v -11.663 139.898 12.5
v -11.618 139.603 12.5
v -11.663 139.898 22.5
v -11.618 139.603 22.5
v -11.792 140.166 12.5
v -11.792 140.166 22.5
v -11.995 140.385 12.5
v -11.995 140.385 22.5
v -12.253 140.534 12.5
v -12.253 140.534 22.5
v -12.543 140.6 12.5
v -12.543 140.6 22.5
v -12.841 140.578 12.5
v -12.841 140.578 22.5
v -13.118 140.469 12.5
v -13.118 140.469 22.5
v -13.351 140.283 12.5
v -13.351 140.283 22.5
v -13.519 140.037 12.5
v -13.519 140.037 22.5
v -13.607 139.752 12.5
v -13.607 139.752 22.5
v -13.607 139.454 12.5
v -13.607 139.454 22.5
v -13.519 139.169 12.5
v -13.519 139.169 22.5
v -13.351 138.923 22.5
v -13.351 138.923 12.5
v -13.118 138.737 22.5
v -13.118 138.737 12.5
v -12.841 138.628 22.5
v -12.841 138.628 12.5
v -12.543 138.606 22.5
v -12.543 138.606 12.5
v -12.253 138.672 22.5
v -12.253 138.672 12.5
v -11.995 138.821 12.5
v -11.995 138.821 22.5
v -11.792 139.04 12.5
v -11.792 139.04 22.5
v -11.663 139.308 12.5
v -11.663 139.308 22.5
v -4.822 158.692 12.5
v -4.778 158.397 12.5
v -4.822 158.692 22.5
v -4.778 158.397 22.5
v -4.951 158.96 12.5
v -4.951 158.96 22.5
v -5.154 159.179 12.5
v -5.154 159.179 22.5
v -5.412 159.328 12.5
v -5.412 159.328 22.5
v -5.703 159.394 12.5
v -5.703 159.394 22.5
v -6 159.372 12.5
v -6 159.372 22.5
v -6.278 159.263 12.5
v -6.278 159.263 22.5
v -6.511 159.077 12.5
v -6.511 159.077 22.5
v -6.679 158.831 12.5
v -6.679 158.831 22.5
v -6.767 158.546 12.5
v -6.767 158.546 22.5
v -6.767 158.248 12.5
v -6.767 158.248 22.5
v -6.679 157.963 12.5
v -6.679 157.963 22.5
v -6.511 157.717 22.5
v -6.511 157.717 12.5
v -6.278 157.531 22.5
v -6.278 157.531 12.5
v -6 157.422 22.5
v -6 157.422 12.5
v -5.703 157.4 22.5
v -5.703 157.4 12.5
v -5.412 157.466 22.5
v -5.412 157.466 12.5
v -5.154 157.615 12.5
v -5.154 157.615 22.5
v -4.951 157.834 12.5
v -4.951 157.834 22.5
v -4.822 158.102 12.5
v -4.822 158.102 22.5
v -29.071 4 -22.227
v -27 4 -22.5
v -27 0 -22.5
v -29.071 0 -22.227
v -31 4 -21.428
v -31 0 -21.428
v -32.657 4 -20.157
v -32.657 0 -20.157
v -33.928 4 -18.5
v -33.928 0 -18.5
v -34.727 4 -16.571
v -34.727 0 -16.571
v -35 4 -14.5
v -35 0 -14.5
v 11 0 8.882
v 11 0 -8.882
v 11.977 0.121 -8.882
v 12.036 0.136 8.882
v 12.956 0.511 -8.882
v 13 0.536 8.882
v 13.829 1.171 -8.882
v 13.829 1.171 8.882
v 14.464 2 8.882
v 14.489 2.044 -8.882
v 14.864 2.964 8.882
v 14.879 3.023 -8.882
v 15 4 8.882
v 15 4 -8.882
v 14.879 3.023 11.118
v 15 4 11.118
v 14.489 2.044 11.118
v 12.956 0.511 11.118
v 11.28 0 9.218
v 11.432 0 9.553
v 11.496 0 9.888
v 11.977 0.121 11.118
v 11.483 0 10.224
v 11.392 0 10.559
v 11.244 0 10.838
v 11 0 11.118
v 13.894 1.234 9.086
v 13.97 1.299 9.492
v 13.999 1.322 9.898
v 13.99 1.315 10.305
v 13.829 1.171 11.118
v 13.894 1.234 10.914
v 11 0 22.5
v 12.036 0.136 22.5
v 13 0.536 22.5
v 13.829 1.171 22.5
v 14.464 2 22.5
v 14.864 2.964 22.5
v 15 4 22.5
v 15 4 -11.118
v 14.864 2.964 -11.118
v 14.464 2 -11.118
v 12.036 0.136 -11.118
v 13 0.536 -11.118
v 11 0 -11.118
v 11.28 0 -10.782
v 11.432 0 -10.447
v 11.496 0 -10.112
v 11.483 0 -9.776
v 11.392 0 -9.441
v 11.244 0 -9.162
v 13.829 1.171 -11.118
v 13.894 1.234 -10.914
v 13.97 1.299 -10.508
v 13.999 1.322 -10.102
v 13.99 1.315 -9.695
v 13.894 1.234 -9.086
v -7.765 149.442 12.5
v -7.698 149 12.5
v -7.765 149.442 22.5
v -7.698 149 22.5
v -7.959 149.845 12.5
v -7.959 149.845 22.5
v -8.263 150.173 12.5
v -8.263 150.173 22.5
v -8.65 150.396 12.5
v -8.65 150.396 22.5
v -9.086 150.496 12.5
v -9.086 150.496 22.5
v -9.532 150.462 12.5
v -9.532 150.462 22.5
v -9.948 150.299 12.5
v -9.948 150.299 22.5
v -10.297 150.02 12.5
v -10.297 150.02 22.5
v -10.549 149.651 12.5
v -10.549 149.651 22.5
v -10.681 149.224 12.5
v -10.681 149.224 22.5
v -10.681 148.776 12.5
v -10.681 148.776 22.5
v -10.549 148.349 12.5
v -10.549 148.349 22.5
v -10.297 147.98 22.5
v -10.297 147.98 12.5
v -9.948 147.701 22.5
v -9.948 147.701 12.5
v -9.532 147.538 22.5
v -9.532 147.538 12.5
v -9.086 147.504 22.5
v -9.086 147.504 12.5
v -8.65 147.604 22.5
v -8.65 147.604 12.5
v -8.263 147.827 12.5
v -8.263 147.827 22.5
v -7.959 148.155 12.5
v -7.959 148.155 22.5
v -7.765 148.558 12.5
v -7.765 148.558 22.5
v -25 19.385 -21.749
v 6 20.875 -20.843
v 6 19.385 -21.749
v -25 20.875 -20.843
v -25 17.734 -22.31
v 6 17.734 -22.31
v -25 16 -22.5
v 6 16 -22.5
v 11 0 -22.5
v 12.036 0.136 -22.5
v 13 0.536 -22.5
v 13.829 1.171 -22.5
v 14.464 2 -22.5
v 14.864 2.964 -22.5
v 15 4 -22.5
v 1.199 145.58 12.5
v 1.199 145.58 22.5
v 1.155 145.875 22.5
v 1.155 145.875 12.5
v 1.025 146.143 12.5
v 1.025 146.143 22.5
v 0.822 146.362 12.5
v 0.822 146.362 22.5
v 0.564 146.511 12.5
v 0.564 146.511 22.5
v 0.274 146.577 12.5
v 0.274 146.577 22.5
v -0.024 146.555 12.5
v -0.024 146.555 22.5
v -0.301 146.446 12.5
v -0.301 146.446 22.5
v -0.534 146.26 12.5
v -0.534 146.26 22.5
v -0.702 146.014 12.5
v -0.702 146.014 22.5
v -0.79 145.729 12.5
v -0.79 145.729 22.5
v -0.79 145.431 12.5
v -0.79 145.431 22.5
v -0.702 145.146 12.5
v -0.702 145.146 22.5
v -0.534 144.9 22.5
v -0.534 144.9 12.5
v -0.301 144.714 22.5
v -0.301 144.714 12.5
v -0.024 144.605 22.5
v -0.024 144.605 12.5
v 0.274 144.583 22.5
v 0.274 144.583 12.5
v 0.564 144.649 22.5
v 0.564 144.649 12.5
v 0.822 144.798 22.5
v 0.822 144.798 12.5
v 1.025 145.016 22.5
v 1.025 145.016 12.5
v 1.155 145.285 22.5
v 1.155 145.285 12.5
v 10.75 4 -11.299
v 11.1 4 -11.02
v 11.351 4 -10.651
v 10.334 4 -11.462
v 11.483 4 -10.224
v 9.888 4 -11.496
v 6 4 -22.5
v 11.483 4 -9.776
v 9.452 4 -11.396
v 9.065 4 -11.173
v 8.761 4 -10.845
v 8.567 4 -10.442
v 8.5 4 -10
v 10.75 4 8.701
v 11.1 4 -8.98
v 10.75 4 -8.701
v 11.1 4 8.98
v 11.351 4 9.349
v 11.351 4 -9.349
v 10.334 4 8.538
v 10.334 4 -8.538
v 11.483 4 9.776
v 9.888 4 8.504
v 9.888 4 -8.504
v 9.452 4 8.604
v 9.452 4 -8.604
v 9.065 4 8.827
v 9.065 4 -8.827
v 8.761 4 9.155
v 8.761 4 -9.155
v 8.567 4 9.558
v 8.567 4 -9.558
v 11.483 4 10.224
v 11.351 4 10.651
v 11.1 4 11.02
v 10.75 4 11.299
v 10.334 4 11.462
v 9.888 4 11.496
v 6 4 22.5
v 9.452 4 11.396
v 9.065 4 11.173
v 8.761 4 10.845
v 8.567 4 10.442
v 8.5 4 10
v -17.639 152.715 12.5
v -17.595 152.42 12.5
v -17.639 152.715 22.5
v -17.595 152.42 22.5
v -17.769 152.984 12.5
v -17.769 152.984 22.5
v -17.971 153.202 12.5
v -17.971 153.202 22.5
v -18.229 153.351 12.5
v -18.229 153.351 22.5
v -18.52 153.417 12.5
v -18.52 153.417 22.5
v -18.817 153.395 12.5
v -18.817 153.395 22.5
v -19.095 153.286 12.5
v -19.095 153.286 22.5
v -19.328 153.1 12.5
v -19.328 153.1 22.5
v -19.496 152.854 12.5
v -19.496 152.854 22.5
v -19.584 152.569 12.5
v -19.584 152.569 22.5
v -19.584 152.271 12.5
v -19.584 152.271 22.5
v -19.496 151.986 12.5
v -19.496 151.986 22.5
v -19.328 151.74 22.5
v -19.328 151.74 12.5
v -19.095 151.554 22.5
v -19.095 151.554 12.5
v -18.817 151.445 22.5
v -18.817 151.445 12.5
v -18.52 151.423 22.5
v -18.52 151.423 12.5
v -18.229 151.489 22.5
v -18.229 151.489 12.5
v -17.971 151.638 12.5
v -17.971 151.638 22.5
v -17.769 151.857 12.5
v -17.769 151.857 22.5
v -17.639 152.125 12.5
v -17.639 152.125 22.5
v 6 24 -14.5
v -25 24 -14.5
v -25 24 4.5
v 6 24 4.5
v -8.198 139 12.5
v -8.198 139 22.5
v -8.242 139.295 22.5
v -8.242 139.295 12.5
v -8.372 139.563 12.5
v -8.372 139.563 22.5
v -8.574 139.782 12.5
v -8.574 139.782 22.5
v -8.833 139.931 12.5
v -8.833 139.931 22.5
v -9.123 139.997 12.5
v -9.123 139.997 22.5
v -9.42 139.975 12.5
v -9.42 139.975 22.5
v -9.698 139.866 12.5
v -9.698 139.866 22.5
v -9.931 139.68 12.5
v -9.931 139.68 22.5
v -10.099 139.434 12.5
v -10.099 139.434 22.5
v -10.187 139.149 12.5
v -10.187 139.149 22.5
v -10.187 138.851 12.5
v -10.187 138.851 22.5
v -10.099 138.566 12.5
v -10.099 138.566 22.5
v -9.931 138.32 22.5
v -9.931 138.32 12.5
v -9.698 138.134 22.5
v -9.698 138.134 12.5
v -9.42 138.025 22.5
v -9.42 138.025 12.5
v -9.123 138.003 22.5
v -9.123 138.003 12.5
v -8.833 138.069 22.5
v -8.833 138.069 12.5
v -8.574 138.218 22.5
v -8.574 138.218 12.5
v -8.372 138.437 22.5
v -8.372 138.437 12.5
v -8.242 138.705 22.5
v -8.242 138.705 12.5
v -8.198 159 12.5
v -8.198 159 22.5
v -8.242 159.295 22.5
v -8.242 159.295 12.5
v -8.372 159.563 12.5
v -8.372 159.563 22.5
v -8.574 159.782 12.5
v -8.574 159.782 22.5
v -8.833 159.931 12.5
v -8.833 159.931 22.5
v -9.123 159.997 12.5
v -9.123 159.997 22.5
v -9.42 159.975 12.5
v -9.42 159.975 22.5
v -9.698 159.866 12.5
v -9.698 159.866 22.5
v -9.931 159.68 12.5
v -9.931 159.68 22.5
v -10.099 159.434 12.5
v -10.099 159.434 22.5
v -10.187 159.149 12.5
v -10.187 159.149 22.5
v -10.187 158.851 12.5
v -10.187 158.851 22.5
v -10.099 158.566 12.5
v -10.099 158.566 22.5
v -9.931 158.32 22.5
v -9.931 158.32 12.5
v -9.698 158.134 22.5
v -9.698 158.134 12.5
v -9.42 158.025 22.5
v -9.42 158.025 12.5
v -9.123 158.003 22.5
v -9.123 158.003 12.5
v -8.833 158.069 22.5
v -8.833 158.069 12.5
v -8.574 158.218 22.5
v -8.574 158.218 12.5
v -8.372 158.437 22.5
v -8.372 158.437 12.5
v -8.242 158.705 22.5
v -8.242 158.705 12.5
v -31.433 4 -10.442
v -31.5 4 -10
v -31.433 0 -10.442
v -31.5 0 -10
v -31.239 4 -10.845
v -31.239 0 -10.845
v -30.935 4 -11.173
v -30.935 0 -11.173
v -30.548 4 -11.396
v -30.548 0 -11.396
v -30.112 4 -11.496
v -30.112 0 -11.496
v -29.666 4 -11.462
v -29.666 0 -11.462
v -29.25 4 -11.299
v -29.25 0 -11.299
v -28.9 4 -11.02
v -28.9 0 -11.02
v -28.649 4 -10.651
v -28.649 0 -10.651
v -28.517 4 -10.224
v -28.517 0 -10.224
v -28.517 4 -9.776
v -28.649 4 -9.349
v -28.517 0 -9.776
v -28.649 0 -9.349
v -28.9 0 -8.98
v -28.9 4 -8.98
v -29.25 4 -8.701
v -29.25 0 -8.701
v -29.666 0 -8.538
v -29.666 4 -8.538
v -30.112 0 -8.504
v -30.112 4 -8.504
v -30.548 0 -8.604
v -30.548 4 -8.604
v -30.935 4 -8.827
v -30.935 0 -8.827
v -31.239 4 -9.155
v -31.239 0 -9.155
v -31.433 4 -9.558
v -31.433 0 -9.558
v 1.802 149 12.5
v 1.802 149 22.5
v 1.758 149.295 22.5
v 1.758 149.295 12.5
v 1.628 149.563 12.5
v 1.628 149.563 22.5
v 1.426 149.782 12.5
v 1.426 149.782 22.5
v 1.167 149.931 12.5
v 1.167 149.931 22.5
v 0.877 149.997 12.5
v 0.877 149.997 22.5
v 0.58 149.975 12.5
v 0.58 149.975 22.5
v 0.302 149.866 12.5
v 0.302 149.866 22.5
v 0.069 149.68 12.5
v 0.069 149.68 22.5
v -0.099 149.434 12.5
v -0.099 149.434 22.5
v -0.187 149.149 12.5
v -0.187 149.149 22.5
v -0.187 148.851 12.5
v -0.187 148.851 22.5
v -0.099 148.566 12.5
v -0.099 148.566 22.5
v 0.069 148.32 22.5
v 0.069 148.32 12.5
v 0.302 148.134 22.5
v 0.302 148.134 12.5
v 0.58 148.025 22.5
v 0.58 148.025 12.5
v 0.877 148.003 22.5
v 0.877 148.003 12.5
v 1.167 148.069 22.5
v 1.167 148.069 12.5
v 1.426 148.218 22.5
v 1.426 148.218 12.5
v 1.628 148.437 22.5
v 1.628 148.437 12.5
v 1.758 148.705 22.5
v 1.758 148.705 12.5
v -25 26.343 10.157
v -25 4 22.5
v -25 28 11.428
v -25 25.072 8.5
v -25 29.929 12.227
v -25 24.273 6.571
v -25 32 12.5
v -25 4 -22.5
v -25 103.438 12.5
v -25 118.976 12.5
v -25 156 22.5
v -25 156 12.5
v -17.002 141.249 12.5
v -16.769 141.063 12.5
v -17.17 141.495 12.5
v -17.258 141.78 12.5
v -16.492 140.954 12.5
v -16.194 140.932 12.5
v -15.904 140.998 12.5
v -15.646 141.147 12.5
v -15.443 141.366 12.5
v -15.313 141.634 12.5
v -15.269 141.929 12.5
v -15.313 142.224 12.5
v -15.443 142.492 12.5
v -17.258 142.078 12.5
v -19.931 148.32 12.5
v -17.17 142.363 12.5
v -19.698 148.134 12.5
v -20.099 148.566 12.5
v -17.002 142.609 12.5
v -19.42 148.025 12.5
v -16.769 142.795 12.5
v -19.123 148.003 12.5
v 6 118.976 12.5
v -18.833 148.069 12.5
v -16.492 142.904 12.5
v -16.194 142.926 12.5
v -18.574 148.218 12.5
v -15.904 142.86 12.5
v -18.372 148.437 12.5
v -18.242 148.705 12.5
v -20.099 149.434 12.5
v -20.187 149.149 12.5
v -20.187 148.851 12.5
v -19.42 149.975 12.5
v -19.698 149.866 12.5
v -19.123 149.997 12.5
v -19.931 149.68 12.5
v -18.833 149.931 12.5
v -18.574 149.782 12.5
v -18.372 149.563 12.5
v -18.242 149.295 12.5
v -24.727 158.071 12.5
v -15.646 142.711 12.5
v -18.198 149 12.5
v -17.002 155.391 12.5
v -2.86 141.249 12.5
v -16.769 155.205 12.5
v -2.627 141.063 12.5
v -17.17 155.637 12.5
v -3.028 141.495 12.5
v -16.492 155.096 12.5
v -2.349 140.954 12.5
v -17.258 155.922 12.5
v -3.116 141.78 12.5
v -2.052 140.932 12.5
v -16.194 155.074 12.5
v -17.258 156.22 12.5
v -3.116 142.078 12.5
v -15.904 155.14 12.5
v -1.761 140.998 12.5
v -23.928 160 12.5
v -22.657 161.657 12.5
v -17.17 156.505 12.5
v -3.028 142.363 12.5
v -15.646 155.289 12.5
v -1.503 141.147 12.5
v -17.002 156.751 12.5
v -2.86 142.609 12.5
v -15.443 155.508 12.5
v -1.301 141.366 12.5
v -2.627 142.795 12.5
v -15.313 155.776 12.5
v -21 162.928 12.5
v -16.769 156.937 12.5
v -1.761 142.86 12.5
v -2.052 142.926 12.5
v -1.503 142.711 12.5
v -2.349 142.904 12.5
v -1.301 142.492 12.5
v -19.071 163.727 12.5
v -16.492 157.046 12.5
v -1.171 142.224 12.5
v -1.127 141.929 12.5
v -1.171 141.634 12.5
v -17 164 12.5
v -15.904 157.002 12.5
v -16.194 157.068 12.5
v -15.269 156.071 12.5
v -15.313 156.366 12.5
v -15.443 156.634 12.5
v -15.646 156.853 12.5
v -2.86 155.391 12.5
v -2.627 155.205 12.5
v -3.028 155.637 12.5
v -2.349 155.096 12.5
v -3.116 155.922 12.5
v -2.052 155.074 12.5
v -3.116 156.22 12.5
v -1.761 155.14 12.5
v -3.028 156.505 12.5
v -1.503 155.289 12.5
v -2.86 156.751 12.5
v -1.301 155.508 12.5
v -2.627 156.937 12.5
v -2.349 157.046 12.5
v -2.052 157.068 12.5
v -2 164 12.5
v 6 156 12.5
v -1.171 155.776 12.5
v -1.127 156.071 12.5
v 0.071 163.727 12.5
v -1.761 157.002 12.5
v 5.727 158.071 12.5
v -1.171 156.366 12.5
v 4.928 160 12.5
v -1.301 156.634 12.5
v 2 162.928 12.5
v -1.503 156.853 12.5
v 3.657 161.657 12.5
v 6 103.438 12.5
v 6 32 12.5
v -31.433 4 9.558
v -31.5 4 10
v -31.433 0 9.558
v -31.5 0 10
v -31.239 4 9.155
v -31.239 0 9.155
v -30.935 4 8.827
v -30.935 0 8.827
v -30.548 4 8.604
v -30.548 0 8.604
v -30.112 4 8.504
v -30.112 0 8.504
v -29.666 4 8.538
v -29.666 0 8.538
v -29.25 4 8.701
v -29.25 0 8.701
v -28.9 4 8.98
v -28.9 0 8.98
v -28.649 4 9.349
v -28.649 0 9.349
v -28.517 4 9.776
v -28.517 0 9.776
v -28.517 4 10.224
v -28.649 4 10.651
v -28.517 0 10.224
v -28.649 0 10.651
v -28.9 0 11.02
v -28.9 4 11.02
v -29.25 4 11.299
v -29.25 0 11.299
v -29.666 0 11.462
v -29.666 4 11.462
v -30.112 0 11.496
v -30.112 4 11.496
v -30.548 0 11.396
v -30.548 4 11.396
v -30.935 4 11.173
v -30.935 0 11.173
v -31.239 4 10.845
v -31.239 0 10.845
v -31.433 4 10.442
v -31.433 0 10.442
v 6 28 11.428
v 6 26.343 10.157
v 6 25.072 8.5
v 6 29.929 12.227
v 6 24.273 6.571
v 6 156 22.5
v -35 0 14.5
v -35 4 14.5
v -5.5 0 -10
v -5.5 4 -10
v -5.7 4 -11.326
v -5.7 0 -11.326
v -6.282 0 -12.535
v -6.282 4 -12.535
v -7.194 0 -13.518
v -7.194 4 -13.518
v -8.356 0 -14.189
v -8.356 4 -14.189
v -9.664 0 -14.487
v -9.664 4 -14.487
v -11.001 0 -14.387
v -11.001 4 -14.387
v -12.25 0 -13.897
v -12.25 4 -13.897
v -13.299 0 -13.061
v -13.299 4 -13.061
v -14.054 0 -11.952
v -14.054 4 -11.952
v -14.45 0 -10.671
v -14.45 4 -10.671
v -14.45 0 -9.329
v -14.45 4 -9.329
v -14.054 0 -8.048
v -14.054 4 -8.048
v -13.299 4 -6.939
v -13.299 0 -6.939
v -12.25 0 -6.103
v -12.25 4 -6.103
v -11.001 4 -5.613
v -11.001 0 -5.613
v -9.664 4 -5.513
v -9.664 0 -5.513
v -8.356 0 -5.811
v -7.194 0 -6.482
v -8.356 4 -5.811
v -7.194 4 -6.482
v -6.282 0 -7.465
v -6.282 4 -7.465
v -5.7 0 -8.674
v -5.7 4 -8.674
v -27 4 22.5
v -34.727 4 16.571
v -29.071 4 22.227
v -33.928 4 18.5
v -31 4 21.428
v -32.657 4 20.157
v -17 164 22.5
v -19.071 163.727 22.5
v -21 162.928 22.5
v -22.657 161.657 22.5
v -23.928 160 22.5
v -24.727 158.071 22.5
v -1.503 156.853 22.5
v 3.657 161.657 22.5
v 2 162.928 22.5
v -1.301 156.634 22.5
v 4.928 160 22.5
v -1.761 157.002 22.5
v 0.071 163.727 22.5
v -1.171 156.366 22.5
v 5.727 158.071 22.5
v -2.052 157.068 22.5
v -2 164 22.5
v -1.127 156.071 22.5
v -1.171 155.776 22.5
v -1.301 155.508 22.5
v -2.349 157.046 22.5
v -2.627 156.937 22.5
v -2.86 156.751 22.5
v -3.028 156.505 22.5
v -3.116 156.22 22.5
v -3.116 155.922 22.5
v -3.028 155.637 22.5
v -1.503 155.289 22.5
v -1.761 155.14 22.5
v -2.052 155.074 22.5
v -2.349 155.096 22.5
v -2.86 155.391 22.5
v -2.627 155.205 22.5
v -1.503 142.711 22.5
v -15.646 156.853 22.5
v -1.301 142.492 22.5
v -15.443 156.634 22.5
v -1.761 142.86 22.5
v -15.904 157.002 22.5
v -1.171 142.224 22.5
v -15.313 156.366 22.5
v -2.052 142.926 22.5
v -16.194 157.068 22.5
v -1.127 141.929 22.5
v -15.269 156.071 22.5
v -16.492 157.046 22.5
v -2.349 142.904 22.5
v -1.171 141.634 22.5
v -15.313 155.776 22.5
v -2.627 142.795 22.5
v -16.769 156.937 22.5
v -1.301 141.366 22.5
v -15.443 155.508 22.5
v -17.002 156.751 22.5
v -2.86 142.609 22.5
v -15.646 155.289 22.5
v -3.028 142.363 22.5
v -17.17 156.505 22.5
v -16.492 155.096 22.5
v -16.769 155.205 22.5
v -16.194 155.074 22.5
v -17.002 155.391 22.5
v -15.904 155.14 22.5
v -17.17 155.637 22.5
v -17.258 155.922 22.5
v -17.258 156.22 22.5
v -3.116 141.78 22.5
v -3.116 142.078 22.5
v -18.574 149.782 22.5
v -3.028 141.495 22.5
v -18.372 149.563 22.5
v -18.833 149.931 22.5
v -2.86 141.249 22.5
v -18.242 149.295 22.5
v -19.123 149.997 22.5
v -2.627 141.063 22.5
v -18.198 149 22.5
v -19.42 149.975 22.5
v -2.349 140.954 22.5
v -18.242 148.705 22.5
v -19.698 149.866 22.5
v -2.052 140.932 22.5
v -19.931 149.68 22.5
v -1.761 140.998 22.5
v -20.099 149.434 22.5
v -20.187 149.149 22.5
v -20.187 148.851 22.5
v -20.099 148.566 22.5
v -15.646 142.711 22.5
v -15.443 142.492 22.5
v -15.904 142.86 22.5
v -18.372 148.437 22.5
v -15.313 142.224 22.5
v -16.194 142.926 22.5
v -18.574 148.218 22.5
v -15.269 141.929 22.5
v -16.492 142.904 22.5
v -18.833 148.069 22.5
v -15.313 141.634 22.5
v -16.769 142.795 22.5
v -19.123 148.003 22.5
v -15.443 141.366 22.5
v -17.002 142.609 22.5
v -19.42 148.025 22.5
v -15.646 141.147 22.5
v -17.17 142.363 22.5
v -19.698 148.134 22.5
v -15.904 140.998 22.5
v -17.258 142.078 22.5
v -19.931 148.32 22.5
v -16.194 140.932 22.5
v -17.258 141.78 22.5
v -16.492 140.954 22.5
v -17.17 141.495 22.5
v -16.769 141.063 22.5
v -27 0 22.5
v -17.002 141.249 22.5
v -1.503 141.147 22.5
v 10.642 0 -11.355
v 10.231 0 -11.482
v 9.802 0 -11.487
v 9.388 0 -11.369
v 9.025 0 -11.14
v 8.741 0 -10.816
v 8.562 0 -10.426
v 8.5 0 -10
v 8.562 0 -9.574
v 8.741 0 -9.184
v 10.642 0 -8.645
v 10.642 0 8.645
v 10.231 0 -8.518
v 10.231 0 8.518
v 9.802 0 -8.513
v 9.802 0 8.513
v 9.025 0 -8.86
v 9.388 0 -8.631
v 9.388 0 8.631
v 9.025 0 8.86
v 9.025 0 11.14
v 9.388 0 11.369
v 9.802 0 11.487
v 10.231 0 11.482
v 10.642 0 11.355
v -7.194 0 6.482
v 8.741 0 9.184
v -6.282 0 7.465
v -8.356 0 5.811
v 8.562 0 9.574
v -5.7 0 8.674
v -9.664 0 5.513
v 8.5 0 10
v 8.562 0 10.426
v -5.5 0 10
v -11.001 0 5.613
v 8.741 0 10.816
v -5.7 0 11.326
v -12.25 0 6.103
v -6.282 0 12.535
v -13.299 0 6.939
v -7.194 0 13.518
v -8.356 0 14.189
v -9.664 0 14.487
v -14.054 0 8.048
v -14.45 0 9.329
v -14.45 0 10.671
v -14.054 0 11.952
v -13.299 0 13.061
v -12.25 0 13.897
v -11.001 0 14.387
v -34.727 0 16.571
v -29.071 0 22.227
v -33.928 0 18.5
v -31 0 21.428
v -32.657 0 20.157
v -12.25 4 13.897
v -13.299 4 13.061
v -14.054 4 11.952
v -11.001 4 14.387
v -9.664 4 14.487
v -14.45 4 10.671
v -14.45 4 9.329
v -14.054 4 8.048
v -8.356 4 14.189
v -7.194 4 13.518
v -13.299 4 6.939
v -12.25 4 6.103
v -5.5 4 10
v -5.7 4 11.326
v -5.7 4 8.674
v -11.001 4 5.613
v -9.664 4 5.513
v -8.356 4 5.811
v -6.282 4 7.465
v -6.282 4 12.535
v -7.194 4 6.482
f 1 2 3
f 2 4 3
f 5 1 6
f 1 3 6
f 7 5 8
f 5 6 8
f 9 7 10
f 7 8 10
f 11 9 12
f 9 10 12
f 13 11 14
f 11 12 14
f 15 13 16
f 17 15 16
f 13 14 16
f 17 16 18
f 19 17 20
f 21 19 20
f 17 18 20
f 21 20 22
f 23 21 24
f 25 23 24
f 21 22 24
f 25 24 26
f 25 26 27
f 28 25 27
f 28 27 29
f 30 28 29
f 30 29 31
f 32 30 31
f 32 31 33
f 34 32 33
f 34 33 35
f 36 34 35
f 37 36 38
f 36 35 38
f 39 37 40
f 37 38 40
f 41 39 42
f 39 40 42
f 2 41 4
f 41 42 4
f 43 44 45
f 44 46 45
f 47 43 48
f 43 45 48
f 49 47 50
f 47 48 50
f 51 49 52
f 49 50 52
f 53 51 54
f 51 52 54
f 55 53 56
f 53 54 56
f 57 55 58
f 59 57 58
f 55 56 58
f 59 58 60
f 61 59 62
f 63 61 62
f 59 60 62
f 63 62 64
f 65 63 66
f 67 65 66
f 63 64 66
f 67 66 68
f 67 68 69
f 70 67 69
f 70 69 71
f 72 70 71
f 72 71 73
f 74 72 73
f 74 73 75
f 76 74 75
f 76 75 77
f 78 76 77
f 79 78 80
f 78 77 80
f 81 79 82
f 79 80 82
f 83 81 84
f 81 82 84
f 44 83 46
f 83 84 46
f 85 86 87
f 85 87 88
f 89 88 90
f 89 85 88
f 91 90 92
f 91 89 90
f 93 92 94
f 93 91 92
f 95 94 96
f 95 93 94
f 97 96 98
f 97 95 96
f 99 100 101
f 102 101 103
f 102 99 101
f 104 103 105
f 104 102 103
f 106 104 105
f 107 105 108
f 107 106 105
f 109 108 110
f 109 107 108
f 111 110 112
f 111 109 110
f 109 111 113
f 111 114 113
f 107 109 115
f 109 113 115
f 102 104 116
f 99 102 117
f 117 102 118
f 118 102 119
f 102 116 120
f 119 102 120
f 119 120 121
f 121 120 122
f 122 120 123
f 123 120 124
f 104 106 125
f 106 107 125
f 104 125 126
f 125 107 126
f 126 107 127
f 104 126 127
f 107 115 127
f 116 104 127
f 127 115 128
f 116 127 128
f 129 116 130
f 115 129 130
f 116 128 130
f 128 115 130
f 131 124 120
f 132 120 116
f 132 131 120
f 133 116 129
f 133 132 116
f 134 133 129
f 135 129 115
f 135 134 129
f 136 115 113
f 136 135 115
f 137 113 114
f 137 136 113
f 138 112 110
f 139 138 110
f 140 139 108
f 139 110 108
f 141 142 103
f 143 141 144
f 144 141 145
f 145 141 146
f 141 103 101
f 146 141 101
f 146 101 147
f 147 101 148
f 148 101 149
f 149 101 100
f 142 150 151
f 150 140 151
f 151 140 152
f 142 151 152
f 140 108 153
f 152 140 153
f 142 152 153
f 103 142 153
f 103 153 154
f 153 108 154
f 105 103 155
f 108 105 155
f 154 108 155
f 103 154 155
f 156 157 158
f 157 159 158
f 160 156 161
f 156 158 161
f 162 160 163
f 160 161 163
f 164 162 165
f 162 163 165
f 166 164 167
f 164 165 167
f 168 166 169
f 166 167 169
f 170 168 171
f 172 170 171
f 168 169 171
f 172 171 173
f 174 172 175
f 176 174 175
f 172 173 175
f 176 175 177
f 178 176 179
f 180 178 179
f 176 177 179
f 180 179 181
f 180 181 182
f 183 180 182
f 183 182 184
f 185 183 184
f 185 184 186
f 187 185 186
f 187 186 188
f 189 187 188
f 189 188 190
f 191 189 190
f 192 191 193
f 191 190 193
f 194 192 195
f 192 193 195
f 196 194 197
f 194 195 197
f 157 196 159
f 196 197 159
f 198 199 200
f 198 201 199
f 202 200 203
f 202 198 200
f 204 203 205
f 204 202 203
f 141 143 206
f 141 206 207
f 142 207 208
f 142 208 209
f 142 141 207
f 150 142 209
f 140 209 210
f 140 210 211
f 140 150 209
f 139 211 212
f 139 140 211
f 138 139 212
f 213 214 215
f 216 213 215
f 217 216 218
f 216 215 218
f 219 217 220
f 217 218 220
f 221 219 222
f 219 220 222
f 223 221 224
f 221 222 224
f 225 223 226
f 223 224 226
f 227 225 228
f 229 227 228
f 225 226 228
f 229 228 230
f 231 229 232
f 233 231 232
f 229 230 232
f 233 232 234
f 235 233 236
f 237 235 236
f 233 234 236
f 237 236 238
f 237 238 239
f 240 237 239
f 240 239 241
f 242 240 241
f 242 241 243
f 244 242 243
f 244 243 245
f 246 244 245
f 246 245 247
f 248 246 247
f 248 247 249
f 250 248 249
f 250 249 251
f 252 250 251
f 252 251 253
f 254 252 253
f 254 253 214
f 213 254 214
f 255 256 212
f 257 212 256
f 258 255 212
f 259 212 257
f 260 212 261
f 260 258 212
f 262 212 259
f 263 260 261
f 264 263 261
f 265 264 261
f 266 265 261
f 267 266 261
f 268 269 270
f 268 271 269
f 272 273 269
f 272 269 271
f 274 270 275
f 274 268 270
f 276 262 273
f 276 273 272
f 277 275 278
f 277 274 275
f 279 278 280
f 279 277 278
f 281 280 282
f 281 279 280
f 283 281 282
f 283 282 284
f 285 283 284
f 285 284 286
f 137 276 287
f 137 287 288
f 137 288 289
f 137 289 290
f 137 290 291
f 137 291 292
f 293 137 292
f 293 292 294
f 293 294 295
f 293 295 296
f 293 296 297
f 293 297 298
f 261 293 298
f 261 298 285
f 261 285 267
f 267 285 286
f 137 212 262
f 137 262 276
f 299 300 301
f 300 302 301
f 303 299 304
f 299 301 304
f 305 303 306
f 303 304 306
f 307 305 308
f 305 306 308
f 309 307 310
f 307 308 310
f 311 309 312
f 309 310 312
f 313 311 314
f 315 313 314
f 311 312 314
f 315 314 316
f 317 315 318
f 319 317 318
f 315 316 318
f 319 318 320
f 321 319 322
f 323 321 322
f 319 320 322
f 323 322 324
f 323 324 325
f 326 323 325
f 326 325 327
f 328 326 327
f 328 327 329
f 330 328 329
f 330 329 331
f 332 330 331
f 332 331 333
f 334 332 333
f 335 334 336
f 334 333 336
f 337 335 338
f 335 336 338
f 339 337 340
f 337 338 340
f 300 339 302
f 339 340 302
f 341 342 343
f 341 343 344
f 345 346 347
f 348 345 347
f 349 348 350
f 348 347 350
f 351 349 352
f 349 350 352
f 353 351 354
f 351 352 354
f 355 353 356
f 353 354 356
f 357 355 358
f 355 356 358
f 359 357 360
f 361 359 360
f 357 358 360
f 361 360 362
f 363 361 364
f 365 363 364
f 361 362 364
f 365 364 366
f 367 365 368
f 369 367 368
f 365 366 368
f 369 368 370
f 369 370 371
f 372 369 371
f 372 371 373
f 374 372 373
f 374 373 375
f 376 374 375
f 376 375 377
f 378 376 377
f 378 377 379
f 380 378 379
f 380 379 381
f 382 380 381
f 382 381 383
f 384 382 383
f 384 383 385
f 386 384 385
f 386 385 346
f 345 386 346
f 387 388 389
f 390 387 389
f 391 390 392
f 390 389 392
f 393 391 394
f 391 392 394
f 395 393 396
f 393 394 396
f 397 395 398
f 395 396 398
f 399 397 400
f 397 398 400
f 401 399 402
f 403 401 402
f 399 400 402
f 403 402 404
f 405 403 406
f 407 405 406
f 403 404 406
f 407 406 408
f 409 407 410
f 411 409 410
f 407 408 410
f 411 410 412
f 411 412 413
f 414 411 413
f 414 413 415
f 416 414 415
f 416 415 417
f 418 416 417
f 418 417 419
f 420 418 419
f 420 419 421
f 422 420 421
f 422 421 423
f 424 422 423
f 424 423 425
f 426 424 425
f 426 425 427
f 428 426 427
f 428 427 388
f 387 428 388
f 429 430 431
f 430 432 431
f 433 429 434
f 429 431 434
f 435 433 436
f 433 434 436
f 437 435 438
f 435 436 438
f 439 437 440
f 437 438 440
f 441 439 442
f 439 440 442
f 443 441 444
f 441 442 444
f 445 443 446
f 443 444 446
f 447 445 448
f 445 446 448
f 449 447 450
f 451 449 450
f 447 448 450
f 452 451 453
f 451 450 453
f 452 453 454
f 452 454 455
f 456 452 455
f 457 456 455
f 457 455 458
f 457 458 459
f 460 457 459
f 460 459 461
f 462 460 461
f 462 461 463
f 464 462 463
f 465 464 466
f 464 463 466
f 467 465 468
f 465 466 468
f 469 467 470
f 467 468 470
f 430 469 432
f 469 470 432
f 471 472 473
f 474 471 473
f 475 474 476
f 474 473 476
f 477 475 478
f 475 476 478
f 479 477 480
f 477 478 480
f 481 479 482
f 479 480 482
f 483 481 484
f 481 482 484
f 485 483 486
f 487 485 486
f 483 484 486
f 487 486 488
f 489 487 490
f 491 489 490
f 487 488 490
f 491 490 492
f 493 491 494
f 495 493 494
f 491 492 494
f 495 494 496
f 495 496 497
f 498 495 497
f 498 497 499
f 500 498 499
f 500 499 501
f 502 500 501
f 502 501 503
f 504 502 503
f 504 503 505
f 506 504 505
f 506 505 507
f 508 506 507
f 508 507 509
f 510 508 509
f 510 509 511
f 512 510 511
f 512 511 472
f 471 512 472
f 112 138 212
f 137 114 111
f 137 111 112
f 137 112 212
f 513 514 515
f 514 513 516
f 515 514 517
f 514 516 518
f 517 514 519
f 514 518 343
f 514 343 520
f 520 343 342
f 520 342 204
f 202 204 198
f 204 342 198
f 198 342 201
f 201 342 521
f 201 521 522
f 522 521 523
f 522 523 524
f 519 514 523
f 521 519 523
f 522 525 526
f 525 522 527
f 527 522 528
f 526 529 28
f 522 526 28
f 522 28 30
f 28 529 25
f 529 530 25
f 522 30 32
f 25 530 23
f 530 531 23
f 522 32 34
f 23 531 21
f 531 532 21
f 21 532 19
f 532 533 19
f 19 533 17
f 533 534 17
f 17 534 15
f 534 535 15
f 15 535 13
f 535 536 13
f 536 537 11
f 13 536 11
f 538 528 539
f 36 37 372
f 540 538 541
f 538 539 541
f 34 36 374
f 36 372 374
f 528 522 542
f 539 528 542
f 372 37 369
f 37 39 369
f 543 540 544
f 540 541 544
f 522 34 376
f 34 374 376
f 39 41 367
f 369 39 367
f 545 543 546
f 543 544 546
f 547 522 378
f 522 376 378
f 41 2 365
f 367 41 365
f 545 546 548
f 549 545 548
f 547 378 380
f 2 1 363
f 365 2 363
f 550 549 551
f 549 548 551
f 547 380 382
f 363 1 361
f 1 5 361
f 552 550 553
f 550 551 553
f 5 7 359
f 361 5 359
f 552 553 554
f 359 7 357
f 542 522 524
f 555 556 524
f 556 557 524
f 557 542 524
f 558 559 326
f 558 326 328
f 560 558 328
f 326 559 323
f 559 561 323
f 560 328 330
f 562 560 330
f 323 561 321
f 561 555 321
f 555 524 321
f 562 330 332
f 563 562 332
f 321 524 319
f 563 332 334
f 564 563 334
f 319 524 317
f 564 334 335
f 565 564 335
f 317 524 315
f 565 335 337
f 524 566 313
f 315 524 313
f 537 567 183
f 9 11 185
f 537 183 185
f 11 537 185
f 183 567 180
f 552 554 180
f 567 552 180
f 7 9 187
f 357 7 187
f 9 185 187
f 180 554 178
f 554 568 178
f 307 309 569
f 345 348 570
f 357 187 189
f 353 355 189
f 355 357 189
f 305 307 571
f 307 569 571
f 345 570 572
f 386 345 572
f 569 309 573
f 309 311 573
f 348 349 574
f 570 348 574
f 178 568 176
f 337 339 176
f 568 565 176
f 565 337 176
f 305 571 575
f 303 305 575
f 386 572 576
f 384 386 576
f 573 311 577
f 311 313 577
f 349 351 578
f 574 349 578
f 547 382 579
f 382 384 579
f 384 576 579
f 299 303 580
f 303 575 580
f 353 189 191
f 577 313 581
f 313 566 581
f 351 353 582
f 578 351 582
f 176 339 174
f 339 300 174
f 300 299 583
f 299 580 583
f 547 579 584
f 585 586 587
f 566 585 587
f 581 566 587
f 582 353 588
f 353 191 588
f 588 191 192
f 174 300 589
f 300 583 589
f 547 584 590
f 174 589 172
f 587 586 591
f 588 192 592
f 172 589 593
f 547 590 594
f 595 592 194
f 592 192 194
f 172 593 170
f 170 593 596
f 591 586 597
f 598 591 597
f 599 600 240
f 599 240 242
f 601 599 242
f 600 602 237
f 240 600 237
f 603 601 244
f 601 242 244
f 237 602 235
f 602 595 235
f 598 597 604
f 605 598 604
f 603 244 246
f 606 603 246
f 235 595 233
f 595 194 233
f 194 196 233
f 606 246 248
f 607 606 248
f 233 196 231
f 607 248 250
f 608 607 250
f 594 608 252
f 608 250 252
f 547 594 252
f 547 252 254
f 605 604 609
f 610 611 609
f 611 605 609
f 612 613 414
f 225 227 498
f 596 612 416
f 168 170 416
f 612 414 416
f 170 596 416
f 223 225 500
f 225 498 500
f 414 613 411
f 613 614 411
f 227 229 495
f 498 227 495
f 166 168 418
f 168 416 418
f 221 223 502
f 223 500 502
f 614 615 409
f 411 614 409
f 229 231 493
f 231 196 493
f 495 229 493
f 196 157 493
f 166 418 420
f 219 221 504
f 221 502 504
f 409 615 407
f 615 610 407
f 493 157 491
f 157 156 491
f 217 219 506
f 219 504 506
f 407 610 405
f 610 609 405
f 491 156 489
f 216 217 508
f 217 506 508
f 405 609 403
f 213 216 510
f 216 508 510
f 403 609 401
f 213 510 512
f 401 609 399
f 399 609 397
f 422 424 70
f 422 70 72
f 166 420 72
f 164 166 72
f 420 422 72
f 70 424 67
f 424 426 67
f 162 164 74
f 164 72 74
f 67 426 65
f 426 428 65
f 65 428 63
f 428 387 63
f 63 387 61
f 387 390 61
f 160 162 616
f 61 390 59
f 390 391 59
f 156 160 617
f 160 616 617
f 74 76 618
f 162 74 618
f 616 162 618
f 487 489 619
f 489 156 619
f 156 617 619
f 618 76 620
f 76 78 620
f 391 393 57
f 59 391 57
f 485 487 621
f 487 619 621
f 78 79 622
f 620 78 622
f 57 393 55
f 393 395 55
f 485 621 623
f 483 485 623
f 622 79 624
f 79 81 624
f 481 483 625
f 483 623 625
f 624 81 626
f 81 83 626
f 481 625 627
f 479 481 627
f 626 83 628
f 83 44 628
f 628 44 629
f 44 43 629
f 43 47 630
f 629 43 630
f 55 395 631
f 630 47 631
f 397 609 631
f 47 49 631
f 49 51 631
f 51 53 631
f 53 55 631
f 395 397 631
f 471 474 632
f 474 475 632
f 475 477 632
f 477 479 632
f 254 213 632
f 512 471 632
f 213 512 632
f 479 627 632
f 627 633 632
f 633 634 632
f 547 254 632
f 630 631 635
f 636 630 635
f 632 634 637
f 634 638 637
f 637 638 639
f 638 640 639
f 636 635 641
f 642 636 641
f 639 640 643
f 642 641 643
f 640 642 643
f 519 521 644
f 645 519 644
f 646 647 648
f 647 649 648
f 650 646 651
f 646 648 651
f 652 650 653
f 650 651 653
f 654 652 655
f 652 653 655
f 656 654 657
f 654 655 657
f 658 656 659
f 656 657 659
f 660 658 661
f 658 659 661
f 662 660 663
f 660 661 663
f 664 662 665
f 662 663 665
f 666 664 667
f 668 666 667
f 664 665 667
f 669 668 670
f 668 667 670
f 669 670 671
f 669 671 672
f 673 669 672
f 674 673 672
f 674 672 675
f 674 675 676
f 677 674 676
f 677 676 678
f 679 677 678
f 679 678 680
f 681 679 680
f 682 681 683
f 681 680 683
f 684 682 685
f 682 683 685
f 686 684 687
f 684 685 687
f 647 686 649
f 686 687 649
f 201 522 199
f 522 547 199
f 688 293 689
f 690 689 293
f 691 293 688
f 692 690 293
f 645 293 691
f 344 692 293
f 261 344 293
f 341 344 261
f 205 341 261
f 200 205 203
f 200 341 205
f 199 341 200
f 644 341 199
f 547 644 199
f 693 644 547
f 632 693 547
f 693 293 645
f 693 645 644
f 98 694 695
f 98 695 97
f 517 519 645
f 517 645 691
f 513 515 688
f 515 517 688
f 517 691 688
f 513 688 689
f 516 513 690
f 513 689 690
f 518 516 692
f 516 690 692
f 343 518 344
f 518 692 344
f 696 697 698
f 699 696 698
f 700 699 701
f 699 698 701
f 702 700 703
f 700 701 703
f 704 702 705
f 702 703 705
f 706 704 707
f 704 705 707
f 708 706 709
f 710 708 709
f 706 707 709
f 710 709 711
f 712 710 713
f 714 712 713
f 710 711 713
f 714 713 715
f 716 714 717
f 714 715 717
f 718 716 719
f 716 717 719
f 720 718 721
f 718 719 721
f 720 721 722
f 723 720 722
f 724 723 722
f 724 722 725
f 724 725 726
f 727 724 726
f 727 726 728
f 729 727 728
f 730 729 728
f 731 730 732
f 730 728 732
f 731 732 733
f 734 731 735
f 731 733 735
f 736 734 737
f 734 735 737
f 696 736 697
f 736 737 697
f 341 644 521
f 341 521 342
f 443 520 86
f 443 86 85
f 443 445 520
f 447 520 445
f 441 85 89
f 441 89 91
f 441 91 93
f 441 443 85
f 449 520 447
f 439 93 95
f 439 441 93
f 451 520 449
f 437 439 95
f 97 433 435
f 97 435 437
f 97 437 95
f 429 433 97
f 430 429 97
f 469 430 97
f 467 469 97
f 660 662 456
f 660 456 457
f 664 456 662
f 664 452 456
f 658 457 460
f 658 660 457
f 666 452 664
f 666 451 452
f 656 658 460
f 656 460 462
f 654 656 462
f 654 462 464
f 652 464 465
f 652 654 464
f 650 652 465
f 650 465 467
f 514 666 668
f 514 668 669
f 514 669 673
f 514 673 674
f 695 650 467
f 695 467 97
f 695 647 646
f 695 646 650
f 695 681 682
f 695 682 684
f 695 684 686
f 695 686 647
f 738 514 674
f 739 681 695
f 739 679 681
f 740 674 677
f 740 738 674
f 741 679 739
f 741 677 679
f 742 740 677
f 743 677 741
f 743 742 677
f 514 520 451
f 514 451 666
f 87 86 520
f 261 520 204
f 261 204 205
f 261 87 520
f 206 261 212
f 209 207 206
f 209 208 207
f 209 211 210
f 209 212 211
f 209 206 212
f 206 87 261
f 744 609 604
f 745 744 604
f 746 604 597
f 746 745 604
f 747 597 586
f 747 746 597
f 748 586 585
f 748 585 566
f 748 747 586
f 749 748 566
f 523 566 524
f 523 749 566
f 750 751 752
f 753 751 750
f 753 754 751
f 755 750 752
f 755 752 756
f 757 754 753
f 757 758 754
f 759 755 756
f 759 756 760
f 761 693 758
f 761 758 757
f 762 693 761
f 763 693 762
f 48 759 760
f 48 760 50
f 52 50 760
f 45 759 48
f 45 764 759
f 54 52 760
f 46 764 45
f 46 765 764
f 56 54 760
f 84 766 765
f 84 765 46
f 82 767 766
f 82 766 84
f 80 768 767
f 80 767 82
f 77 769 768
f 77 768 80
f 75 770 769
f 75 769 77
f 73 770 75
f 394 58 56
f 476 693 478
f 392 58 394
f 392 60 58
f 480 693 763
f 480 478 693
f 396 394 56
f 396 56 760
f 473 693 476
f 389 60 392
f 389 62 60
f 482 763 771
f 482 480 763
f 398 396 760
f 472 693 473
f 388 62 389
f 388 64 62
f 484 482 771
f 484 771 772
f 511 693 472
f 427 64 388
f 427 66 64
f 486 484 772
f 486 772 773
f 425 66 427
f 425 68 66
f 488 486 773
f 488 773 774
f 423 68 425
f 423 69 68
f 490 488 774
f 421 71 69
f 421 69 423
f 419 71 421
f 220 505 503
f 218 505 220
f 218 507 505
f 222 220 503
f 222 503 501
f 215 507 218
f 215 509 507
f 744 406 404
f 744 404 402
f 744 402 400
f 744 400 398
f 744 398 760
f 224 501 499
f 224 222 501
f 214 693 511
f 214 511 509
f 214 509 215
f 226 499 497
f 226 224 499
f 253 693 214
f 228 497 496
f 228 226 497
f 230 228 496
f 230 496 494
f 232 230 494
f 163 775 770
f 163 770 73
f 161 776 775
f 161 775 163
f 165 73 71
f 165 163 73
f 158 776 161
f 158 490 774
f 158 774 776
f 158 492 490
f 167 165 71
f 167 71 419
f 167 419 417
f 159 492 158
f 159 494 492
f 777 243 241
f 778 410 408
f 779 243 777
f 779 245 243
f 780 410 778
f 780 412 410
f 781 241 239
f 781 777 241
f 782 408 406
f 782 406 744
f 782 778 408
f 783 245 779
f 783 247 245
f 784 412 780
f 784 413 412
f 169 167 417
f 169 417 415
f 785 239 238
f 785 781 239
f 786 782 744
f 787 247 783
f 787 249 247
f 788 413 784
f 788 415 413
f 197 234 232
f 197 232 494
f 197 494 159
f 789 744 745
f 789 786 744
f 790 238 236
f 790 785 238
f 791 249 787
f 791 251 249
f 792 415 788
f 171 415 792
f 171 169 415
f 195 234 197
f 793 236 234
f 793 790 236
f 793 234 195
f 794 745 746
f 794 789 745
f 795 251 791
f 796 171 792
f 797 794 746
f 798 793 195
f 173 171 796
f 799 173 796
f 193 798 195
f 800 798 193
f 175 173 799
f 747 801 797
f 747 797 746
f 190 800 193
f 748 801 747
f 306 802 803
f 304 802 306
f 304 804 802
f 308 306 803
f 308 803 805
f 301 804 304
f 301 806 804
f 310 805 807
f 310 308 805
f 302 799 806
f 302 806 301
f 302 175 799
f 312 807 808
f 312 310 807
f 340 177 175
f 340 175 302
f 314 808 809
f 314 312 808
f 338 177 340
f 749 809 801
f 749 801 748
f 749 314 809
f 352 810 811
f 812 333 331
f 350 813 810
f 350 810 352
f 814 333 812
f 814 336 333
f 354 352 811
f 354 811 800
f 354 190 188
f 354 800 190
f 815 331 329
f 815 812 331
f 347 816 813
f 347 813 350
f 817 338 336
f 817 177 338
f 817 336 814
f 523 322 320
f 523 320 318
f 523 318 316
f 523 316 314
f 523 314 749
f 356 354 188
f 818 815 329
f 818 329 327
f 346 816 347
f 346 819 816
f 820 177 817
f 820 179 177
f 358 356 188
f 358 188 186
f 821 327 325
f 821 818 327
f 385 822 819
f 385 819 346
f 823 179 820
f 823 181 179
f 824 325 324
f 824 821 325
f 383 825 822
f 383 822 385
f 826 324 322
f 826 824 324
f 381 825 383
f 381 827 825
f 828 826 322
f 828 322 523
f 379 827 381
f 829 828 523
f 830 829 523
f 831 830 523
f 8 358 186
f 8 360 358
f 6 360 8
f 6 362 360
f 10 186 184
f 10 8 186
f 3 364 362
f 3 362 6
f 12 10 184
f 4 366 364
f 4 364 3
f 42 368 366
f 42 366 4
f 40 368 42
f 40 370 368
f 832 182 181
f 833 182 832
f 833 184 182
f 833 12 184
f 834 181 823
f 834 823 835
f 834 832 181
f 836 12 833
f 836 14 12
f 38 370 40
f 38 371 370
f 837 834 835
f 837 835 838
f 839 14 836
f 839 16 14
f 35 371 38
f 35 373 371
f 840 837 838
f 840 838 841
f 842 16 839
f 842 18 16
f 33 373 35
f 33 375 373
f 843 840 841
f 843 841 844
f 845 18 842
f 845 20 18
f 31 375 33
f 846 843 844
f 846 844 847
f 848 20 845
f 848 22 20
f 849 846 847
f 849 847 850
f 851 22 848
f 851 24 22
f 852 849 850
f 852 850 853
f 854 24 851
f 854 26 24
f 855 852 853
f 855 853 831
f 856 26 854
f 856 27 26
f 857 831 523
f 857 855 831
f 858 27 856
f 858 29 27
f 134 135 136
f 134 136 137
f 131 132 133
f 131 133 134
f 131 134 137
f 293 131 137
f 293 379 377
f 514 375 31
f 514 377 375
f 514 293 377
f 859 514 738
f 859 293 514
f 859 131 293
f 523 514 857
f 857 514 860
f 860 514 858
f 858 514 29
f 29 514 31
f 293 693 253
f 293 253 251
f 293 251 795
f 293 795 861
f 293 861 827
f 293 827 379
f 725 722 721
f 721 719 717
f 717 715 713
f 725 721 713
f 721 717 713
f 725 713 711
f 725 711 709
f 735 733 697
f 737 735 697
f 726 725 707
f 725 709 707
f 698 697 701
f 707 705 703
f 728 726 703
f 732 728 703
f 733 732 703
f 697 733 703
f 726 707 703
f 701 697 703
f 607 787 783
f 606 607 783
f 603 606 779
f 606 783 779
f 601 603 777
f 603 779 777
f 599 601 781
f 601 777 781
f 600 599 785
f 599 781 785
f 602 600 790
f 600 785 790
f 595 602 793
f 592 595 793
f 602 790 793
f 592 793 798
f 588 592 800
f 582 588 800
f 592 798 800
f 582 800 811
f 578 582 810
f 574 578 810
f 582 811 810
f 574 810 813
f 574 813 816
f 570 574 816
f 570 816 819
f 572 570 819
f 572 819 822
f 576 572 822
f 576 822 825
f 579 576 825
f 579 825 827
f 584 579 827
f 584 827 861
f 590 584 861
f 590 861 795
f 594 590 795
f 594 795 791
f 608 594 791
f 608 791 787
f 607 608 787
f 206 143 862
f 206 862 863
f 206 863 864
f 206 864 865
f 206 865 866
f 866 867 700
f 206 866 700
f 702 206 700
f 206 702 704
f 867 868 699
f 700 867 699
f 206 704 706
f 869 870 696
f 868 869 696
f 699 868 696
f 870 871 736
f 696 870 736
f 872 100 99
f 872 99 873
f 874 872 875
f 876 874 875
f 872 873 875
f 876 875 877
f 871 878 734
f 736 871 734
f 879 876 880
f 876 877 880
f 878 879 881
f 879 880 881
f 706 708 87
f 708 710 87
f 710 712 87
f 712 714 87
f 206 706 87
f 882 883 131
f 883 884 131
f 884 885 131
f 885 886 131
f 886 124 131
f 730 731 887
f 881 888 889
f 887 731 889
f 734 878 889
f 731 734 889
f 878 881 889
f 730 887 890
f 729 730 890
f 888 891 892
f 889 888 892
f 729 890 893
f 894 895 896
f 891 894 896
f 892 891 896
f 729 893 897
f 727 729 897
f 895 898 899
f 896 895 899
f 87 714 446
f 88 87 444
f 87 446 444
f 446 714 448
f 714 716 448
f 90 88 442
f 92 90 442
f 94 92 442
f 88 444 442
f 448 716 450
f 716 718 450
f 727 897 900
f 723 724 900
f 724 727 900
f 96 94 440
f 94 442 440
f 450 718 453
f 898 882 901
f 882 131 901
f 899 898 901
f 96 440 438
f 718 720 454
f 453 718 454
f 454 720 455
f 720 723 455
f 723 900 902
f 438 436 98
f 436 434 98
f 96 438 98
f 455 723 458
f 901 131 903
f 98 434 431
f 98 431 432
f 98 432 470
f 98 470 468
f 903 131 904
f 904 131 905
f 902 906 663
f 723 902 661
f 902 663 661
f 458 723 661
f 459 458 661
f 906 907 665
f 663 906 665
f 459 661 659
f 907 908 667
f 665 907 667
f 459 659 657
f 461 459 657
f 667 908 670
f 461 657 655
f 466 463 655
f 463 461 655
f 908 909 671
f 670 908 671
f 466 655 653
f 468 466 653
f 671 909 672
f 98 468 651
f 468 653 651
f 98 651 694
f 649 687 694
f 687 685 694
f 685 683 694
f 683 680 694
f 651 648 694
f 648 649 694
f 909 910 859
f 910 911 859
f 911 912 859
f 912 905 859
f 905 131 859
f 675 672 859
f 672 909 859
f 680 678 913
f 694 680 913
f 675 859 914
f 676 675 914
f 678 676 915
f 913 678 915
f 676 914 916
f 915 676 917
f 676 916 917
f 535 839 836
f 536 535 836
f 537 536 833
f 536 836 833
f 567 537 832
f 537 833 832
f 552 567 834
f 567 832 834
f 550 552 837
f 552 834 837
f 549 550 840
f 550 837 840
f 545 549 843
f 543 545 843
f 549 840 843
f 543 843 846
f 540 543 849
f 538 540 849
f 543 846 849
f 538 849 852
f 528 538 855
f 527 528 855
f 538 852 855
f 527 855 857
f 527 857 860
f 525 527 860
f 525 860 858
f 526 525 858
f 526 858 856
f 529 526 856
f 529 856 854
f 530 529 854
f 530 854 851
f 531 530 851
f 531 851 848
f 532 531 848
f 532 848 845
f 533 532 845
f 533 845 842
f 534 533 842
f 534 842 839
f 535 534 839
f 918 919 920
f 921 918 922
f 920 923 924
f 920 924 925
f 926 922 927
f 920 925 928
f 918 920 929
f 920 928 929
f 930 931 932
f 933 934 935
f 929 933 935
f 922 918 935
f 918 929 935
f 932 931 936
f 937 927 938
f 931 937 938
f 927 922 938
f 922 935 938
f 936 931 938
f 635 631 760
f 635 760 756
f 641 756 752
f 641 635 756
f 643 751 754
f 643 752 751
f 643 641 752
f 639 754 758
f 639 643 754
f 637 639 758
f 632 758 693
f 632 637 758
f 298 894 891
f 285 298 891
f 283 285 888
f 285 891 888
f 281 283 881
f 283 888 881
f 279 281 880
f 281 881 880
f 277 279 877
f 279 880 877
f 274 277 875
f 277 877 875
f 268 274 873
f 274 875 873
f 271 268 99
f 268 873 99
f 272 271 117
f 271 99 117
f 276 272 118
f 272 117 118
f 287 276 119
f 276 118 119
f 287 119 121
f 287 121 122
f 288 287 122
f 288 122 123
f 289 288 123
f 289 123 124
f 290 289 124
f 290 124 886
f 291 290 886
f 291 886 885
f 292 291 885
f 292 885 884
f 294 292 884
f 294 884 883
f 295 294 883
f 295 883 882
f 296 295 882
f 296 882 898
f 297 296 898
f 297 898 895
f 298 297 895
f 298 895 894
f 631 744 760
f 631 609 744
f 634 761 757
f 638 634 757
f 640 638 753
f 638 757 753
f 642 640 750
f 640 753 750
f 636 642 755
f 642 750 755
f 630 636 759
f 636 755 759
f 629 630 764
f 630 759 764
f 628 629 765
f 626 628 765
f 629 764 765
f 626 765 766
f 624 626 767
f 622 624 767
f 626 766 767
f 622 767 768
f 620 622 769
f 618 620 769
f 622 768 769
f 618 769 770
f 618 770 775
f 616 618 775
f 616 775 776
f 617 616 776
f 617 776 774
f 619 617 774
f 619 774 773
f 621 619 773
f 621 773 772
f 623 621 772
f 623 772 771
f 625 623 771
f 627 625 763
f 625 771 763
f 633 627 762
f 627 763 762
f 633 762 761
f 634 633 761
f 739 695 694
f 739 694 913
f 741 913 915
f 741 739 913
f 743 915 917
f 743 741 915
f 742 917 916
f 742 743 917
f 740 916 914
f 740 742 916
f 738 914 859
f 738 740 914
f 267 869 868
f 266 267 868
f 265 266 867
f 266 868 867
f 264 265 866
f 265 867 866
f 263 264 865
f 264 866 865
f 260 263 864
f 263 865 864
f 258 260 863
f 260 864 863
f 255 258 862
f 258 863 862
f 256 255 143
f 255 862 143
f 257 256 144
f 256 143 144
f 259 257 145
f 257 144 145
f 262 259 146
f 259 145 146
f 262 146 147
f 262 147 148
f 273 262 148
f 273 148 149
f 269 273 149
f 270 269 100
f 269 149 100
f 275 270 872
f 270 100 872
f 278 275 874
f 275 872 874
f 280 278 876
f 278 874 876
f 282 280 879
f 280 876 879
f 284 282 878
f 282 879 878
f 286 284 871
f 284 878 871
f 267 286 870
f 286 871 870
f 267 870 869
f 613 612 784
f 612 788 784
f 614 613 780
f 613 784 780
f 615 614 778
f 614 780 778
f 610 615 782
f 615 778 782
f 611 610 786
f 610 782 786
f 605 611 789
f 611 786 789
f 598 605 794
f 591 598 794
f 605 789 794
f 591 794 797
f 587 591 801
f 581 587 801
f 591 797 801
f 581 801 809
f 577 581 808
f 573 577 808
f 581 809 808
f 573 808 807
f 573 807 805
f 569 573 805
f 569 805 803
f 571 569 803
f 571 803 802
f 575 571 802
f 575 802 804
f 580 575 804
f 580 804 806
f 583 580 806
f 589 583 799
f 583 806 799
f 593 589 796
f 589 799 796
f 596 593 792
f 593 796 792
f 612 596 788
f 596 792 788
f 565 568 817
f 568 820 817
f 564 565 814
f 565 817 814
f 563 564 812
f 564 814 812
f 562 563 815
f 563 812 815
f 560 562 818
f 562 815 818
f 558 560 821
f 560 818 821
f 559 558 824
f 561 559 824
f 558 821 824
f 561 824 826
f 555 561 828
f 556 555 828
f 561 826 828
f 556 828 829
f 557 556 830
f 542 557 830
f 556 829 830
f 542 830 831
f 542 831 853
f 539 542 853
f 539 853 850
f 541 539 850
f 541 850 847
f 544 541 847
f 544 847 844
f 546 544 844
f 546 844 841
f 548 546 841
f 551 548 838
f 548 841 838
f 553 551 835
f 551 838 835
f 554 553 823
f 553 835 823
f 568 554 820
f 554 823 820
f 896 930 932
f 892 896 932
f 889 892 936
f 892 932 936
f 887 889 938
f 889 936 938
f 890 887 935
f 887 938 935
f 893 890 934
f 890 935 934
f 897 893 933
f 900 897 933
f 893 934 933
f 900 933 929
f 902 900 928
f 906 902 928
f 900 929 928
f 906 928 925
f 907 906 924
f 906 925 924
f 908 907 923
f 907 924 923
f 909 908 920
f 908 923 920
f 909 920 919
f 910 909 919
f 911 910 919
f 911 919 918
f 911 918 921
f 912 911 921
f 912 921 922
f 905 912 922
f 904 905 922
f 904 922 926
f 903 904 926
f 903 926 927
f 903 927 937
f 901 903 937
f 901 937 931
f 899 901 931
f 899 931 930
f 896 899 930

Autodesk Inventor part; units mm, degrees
ref_plane "YZ Plane" through (0, 0, 0) normal (1, 0, 0) x (0, 1, 0)
ref_plane "XZ Plane" through (0, 0, 0) normal (0, 1, 0) x (-1, 0, 0)
ref_plane "XY Plane" through (0, 0, 0) normal (0, 0, 1) x (1, 0, 0)
sketch "Sketch1" plane through (0, 0, 0) normal (0, 1, 0) x (-1, 0, 0)
  line L0 (-10, -10) -> (10, -10)
  line L1 (10, -10) -> (10, 10)
  line L2 (10, 10) -> (-10, 10)
  line L3 (-10, 10) -> (-10, -10)
  line L4 (-10, -10) -> (10, 10) construction
  line L5 (10, -10) -> (-10, 10) construction
  line L6 (10, 10) -> (30, 10)
  line L7 (30, 10) -> (30, -10)
  line L8 (30, -10) -> (10, -10)
  line L9 (10, -10) -> (10, 10)
  circle A0 centre (30, 10) radius 1.5
  circle A1 centre (30, -10) radius 1.5
  circle A2 centre (10, -10) radius 1.5
  circle A3 centre (10, 10) radius 1.5
  circle A4 centre (-10, 10) radius 1.5
  circle A5 centre (-10, -10) radius 1.5
  line L10 (-15, 22.5) -> (35, 22.5)
  line L11 (35, 22.5) -> (35, -22.5)
  line L12 (35, -22.5) -> (-15, -22.5)
  line L13 (-15, -22.5) -> (-15, 22.5)
  line L14 (-15, 22.5) -> (35, -22.5) construction
  line L15 (35, 22.5) -> (-15, -22.5) construction
  point P0 (0, 0)
  point P1 (10, 0)
  dimension "d0" = 20
  dimension "d1" = 20
  dimension "d2" = 20
  dimension "d3" = 20
  dimension "d4" = 3
  dimension "d5" = 3
  dimension "d6" = 3
  dimension "d7" = 3
  dimension "d8" = 3
  dimension "d9" = 3
  dimension "d10" = 5
  dimension "d11" = 12.5
extrude "Extrusion1" add sketch "Sketch1" along normal blind 4 contours A5 L3 A4 L2 A3 L1 A2 L0 | L1 A3 L6 A0 L7 A1 L8 A2 | L10 L11 L12 L13
fillet "Fillet1" radius 4 1 edges at (15, 0, 0)
sketch "Sketch2" plane through (0, 4, 0) normal (0, 1, 0) x (1, 0, 0)
  line L0 (-35, -22.5) -> (15, -22.5) projected
  line L1 (15, 22.5) -> (-35, 22.5) projected
  line L2 (-25, -22.5) -> (6, -22.5)
  line L3 (6, -22.5) -> (6, 22.5)
  line L4 (6, 22.5) -> (-25, 22.5)
  line L5 (-25, 22.5) -> (-25, -22.5)
  line L6 (-35, 22.5) -> (-35, -22.5) projected
  line L7 (15, -22.5) -> (15, 22.5) projected
  circle A0 centre (-10, -10) radius 1.5 projected
  circle A1 centre (-10, -10) radius 4.5
  circle A2 centre (-10, 10) radius 1.5 projected
  circle A3 centre (-10, 10) radius 4.5
  point P0 (0, 0)
  point P1 (-6.25, -15)
  point P2 (-13.75, -15)
  point P3 (-13.75, 15)
  point P4 (-6.25, 15)
  dimension "d15" = 10
  dimension "d16" = 9
  dimension "d17" = 9
  dimension "d18" = 9
extrude "Extrusion2" cut sketch "Sketch2" against normal blind 4 contours A0 | A1 | A3
extrude "Extrusion3" add sketch "Sketch2" along normal blind 160 contours L5 L1 L3 L0 | A0 | A1 | A2 | A3
fillet "Fillet2" radius 8 2 edges at (-35, 2, 22.5) (-35, 2, -22.5)
sketch "Sketch3" plane through (-25, 164, 22.5) normal (0, 0, 1) x (1, 0, 0)
  line L0 (31, 0) -> (0, 0) projected
  circle A0 centre (15.8021, -15) radius 10
  circle A1 centre (15.8021, -5) radius 1
  circle A2 centre (19.2223, -5.6031) radius 1
  circle A3 centre (22.8732, -7.9289) radius 1
  line L1 (15.8021, -15) -> (19.2223, -5.6031)
  line L2 (15.8021, -15) -> (22.8732, -7.9289)
  circle A4 centre (5.8021, -15) radius 1
  circle A5 centre (15.8021, -25) radius 1
  circle A6 centre (25.8021, -15) radius 1
  circle A7 centre (6.4052, -11.5798) radius 1
  circle A8 centre (12.3819, -24.3969) radius 1
  circle A9 centre (25.199, -18.4202) radius 1
  circle A10 centre (8.731, -7.9289) radius 1
  circle A11 centre (8.731, -22.0711) radius 1
  circle A12 centre (22.8732, -22.0711) radius 1
  line L3 (15.8021, -15) -> (15.8021, 0)
  point P0 (25, -164)
  dimension "d24" = 20
  dimension "d26" = 2
  dimension "d27" = 2
  dimension "d30" = 2
  dimension "d33" = 360
  dimension "d37" = 360
  dimension "d41" = 360
  dimension "d54" = 15
  dimension "d55" = 45
  dimension "d56" = 20
extrude "Extrusion4" cut sketch "Sketch3" against normal blind 100 contours A0 A6 | A0 A6 | A3 L2 A0 | A0 A3 | A9 A0 | A0 A9 | L2 A3 A0 | A12 A0 | A0 A12 | A2 L1 A0 | A0 A2 | A2 A0 L1 | L3 A0 A1 | A1 A0 L3 | A1 L3 A0 | A0 L3 A1 | A5 A0 | A0 A5 | A10 A0 | A0 A10 | A8 A0 | A0 A8 | A7 A0 | A0 A7 | A11 A0 | A0 A11 | A4 A0 | A0 A4
sketch "Sketch4" plane through (0, 164, 0) normal (0, 1, 0) x (1, 0, 0)
  line L0 (-25, 22.5) -> (-25, -22.5) projected
  line L1 (6, 22.5) -> (-25, 22.5) projected
  line L2 (-25, -12.5) -> (6, -12.5)
  line L3 (6, -12.5) -> (6, 22.5)
  line L4 (6, 22.5) -> (-25, 22.5)
  line L5 (-25, 22.5) -> (-25, -12.5)
  line L6 (-25, -22.5) -> (6, -22.5) projected
  point P0 (0, 0)
  dimension "d45" = 10
extrude "Extrusion5" cut sketch "Sketch4" against normal blind 140
fillet "Fillet3" radius 8 1 edges at (-9.5, 24, 12.5)
fillet "Fillet4" radius 8 2 edges at (-25, 164, 17.5) (6, 164, 17.5)
fillet "Fillet5" radius 8 1 edges at (-9.5, 24, -22.5)
sketch "Sketch5" plane through (6, 4, 22.5) normal (1, 0, 0) x (0, 0, -1)
  line L0 (10, 28) -> (10, 152) projected
  line L1 (18, 20) -> (37, 20) projected
  line L2 (10, 99.4385) -> (37, 20)
  arc A0 (45, 12) -> (37, 20) centre (37, 12) ccw projected
  line L3 (10, 114.9758) -> (45, 12)
  arc A1 (45, 12) -> (37, 20) centre (37, 12) ccw projected
  line L4 (37, 20) -> (18, 20) projected
  arc A2 (10, 28) -> (18, 20) centre (18, 28) ccw projected
  line L5 (10, 28) -> (10, 152) projected
  line L6 (0, 152) -> (10, 152) projected
  line L7 (0, 0) -> (0, 152) projected
  line L8 (45, 0) -> (0, 0) projected
  line L9 (45, 0) -> (45, 12) projected
  point P0 (22.5, -4)
  point P1 (43.3431, 16.875)
  dimension "d51" = 5
extrude "Extrusion6" add sketch "Sketch5" against normal up to surface (31 mm away) contours L0 L3 A0 L2
sketch "Sketch6" plane through (6, 4, 22.5) normal (0, 0, 1) x (1, 0, 0)
  circle A0 centre (-15.1979, 155) radius 1 projected
  circle A1 centre (-15.1979, 135) radius 1 projected
  line L0 (-15.1979, 155) -> (-15.1979, 135)
  circle A2 centre (-15.1979, 145) radius 1.5
  point P0 (-6, -4)
  dimension "d57" = 3
extrude "Extrusion7" cut sketch "Sketch6" against normal blind 20 contours A2 L0 | L0 A2
properties part number "Vertical_Stereo_1"
